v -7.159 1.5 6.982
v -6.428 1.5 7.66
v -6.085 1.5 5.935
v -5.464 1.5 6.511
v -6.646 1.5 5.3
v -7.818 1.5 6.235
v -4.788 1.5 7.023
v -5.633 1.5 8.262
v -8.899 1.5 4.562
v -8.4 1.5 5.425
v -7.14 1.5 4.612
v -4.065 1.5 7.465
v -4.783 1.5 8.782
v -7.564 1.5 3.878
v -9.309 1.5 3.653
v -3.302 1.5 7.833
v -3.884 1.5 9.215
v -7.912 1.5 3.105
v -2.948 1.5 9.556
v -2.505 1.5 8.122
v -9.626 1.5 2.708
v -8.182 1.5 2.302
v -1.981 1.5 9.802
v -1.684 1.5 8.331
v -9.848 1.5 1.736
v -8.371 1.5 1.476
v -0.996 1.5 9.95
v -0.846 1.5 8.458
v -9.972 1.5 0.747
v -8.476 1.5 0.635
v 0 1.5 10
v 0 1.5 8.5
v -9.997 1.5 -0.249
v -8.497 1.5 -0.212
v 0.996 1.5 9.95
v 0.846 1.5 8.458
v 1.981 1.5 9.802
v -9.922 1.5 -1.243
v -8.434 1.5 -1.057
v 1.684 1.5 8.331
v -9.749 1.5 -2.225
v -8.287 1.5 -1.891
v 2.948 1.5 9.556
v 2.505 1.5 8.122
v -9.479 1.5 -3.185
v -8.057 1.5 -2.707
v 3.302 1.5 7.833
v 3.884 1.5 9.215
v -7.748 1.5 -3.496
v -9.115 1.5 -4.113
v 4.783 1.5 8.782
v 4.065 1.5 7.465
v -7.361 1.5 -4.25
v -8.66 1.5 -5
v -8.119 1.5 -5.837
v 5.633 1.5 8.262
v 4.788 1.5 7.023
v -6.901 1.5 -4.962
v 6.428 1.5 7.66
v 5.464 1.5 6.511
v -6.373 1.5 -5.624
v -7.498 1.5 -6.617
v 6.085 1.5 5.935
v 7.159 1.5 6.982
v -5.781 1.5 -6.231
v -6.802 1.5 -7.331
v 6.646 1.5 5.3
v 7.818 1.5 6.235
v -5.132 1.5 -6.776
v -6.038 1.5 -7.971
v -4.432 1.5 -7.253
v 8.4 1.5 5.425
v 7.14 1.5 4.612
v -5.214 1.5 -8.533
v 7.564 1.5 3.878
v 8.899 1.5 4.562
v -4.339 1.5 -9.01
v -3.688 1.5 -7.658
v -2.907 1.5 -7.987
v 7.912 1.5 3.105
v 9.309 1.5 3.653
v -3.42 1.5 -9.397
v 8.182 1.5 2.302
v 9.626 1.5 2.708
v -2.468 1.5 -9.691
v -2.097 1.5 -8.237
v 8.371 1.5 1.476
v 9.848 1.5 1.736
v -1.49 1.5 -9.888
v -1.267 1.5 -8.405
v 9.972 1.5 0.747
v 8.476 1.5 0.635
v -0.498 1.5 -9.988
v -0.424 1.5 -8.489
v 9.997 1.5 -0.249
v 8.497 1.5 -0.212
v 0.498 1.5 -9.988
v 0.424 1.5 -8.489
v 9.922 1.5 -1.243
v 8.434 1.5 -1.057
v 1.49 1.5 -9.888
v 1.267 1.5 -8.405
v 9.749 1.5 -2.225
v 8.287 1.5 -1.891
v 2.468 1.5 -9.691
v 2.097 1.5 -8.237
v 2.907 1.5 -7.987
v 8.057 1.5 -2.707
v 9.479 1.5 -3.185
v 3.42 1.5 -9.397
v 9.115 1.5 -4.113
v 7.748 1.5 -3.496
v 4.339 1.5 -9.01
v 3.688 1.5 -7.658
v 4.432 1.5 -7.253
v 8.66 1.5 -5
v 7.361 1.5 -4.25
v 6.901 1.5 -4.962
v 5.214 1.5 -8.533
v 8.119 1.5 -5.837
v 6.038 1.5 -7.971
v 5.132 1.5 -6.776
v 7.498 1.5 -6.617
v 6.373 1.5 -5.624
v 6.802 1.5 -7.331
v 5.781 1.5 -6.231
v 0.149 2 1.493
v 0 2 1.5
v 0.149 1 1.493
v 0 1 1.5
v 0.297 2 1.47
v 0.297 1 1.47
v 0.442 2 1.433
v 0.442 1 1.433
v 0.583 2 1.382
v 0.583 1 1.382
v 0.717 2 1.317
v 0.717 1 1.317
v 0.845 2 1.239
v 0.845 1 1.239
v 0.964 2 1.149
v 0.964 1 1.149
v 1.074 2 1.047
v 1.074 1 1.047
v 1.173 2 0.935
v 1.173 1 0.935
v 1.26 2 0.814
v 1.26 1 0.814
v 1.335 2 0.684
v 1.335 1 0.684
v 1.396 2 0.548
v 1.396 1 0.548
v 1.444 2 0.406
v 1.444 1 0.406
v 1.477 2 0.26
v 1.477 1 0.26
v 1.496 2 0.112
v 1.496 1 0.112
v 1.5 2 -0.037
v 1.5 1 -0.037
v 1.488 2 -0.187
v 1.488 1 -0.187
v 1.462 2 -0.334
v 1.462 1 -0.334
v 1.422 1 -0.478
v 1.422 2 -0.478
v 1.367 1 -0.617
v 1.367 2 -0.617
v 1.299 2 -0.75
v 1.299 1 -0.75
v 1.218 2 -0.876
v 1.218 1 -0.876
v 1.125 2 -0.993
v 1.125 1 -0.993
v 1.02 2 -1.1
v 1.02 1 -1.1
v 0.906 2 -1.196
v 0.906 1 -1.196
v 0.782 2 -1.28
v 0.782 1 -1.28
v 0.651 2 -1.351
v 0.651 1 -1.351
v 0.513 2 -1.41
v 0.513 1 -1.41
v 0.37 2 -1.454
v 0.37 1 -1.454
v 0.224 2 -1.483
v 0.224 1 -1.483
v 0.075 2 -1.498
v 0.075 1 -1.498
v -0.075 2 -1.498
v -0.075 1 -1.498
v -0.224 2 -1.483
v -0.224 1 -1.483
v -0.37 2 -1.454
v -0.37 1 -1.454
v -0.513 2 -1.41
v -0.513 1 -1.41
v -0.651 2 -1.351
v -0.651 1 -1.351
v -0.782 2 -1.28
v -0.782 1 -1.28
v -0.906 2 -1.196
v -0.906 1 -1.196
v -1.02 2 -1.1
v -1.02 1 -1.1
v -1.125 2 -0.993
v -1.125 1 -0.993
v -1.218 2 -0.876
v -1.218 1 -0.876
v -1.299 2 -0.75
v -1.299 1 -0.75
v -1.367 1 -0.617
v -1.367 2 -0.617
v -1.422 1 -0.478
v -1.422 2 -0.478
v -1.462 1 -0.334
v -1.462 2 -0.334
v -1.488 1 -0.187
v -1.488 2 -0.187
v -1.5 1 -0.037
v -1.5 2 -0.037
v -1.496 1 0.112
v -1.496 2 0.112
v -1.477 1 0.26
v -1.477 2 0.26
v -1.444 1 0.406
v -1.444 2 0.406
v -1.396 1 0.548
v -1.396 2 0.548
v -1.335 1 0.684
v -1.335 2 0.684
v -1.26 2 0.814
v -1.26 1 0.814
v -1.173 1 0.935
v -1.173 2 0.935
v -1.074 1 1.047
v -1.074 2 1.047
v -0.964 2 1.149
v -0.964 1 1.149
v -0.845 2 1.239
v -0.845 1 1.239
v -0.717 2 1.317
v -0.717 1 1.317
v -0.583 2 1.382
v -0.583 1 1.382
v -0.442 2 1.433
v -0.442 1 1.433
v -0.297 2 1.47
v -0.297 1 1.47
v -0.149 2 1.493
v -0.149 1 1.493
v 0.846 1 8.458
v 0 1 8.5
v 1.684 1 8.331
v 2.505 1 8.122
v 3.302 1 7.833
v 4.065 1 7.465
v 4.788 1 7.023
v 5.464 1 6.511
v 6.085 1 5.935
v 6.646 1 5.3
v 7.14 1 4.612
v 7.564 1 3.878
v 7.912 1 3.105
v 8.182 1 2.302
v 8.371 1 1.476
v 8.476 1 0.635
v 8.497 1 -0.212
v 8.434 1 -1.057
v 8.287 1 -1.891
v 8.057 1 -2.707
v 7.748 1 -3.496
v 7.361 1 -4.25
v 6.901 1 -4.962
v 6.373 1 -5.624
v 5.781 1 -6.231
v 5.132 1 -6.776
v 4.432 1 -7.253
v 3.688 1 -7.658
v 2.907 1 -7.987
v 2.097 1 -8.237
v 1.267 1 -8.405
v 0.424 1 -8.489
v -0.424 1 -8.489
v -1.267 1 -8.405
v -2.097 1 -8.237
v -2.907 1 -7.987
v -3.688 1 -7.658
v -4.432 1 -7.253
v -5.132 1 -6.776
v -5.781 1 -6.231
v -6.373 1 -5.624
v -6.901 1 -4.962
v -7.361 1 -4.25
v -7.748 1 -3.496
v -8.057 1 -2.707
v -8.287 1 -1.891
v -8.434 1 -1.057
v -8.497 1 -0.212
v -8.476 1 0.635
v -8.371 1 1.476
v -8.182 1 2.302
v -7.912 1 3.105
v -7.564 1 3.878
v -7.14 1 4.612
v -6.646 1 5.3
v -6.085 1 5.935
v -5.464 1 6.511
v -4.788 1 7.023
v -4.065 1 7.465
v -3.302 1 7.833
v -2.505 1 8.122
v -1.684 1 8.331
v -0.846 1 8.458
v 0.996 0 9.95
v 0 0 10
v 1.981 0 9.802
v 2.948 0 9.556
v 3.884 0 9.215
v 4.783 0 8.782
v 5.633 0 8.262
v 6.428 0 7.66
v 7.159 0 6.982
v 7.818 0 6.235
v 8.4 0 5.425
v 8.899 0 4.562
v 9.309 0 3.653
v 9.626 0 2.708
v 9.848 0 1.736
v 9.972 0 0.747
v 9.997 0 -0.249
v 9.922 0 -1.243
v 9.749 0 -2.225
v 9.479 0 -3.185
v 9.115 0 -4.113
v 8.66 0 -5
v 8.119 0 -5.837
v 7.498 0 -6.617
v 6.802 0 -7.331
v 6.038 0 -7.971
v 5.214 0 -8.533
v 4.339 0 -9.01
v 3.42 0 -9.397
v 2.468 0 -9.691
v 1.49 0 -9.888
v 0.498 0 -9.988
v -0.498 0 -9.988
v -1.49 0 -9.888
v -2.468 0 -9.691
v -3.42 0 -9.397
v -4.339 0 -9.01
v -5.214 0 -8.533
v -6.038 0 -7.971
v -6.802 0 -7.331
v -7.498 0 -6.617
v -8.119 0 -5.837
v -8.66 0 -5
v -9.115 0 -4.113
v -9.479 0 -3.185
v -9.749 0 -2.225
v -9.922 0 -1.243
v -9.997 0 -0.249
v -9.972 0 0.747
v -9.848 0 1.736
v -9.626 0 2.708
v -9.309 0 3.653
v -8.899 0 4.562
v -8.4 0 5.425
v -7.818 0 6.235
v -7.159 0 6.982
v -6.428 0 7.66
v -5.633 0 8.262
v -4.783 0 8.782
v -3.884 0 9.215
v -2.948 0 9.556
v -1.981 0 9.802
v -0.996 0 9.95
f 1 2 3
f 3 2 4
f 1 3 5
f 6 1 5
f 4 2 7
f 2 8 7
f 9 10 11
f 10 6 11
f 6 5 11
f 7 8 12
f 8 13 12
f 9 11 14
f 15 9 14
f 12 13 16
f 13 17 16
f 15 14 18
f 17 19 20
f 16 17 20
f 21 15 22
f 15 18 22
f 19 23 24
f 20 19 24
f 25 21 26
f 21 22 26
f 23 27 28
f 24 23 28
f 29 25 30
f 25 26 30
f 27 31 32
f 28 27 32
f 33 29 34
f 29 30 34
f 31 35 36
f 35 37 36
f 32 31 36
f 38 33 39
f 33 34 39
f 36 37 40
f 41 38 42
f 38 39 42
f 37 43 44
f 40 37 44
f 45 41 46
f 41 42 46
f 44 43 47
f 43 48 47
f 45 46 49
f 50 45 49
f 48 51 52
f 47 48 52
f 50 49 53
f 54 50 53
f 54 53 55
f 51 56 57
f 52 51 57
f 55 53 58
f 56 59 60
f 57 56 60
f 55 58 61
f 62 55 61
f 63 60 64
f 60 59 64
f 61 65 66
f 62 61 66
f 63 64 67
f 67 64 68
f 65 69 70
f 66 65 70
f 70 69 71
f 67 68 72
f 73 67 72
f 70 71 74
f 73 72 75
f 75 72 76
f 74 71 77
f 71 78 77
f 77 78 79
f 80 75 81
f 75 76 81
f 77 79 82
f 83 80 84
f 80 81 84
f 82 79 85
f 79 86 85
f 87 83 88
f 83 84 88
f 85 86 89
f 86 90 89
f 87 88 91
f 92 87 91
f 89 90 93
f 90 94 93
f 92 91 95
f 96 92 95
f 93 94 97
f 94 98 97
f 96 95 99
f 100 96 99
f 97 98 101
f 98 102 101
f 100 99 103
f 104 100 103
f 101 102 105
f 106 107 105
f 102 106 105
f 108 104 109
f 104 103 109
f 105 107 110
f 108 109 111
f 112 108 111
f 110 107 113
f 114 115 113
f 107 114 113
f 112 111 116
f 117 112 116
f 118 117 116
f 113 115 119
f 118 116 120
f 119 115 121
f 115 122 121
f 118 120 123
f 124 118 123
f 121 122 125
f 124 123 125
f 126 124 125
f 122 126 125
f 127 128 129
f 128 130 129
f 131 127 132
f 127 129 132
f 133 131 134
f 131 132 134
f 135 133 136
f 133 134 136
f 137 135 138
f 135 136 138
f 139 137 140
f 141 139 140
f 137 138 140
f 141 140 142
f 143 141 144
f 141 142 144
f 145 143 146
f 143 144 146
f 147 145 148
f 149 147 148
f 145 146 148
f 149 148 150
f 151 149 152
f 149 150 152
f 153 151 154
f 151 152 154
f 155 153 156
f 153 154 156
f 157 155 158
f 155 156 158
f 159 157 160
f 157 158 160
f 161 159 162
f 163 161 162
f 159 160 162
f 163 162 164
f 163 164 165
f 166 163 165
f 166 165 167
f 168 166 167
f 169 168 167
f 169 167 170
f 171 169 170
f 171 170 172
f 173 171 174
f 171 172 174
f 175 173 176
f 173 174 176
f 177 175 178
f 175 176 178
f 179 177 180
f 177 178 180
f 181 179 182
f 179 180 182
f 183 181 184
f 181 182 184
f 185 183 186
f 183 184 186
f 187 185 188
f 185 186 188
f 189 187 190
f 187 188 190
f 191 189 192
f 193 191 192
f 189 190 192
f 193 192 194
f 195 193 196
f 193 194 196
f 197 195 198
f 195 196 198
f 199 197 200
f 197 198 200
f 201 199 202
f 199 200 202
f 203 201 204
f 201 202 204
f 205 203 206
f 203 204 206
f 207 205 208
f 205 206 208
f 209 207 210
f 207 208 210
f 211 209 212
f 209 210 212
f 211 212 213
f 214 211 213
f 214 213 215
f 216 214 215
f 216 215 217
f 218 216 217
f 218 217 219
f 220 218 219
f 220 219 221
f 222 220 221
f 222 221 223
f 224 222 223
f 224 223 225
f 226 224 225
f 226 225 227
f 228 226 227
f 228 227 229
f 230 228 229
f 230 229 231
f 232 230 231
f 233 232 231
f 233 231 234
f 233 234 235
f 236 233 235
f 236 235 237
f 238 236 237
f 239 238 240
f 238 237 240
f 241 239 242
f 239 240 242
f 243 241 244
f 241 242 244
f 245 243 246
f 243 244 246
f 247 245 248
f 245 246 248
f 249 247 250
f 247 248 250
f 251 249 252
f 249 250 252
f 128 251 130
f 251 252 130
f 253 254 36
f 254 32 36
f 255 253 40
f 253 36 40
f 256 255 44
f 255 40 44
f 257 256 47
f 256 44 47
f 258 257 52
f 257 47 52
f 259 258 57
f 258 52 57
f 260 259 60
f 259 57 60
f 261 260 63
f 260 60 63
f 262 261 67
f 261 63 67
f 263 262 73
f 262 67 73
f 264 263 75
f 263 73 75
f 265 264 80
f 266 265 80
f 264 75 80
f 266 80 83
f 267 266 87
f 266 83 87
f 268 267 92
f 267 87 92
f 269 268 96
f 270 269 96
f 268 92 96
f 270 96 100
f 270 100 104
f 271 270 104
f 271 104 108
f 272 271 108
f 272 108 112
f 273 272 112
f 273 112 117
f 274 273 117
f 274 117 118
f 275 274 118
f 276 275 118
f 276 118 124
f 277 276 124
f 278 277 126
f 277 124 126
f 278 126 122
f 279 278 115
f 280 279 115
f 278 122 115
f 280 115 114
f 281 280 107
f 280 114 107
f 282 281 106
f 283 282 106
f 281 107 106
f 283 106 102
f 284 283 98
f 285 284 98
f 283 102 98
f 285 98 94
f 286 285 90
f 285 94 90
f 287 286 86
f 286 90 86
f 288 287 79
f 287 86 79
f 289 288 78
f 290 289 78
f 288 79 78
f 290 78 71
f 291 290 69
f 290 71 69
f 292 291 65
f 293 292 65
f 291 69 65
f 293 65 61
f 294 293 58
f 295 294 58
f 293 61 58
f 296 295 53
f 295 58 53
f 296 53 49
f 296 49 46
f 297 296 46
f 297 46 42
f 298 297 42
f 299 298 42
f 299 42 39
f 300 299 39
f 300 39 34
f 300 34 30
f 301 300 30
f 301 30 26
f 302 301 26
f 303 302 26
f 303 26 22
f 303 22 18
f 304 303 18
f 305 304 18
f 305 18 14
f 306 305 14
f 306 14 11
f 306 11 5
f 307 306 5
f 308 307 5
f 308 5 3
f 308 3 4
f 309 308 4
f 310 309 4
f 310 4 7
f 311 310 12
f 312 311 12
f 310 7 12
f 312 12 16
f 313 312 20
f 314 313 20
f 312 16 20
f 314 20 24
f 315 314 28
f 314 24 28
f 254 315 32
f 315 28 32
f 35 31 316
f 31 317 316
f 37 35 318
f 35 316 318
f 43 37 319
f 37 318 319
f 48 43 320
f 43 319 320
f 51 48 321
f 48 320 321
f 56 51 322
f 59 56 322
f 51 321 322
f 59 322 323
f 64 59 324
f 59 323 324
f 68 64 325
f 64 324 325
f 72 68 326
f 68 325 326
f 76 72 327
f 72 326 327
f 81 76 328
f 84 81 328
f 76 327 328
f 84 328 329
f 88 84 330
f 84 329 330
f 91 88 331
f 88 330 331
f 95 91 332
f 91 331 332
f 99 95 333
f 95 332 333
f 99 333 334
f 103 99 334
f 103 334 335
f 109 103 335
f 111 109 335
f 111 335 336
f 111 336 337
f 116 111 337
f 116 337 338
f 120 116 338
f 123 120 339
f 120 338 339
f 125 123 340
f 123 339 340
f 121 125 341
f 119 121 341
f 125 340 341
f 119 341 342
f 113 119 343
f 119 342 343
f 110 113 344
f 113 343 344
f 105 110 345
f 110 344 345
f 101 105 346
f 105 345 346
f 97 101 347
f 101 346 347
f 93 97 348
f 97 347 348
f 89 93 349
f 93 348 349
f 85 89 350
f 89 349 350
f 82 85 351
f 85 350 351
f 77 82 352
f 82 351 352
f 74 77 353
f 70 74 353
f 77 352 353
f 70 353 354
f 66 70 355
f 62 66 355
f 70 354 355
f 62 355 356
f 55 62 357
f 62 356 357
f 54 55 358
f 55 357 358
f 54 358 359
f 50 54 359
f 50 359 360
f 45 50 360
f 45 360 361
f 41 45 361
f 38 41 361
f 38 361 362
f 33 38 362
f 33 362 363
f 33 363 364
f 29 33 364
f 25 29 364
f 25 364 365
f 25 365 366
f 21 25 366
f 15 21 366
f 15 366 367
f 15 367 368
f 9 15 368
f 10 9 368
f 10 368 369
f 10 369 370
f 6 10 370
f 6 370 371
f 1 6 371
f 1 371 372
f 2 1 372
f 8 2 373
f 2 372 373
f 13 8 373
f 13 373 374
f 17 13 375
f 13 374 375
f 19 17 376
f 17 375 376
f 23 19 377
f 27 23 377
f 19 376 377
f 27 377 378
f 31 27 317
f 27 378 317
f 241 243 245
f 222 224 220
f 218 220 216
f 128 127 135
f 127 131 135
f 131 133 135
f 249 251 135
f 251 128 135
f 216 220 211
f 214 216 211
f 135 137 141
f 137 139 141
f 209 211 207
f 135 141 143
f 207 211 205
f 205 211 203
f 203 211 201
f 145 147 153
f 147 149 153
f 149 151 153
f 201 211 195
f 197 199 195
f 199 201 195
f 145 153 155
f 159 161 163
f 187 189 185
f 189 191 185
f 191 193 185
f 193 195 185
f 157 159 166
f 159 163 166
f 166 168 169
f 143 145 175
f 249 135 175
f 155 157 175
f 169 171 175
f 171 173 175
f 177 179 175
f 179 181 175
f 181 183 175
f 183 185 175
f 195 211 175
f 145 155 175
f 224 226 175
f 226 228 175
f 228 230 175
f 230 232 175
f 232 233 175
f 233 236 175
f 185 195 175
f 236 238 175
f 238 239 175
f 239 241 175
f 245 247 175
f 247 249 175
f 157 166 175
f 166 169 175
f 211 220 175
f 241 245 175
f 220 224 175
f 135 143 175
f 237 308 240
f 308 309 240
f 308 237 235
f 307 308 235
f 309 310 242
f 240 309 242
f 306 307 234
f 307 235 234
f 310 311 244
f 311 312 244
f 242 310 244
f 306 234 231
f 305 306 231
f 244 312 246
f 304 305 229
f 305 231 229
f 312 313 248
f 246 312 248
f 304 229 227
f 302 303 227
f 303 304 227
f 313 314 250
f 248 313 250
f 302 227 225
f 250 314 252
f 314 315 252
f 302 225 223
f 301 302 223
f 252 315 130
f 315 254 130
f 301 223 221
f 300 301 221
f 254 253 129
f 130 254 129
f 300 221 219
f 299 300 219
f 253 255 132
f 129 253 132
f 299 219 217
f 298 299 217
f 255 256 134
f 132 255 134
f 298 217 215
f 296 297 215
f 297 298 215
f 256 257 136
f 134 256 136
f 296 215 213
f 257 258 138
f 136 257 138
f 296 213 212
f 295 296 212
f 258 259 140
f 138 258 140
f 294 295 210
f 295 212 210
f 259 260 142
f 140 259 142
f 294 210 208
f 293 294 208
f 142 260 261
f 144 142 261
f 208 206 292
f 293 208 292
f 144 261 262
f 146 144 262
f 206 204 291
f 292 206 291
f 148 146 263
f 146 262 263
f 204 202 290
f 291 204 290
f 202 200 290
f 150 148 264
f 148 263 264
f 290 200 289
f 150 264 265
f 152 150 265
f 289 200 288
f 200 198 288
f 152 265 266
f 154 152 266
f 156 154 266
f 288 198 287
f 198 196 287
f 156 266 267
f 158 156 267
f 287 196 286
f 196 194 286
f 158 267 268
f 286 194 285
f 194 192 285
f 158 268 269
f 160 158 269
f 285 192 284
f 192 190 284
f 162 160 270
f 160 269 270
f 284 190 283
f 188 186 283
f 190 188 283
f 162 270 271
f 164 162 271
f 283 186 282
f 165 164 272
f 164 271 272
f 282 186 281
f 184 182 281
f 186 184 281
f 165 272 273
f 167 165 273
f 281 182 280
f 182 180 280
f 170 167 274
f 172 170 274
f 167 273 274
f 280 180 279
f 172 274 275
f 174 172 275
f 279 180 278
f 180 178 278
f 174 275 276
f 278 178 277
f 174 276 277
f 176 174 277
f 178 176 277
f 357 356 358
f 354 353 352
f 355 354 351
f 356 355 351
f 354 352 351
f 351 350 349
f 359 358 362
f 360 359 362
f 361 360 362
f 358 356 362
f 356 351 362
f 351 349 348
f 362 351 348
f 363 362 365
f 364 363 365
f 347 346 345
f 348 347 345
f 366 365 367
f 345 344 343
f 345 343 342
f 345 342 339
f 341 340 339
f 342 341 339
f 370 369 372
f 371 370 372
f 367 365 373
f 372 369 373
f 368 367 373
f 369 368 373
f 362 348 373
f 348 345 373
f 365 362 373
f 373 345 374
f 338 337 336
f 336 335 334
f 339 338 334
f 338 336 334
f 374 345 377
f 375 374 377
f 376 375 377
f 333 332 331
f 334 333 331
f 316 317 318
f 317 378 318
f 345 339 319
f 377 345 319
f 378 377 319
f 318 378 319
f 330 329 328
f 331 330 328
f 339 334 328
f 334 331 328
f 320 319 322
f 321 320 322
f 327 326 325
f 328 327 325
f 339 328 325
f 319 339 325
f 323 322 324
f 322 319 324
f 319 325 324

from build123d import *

# Parameters (mm, degrees)
F0_W = 1
F0_H = 7


with BuildPart() as f1:
    # F0 (on Right) → F1 (revolve)
    with BuildSketch(Plane.YZ):
        Polygon((0, 10), (0, 8.5), (1, 8.5), (1.5, 8.5), (1.5, 10), align=None)
        with Locations((0.5, 5)):
            Rectangle(F0_W, F0_H)
        Polygon((0, 1.5), (0, 0), (2, 0), (2, 1.5), (1, 1.5), align=None)
    revolve(axis=Axis((0, 1, 0), (0, 1, 0)))


solid = f1.part
